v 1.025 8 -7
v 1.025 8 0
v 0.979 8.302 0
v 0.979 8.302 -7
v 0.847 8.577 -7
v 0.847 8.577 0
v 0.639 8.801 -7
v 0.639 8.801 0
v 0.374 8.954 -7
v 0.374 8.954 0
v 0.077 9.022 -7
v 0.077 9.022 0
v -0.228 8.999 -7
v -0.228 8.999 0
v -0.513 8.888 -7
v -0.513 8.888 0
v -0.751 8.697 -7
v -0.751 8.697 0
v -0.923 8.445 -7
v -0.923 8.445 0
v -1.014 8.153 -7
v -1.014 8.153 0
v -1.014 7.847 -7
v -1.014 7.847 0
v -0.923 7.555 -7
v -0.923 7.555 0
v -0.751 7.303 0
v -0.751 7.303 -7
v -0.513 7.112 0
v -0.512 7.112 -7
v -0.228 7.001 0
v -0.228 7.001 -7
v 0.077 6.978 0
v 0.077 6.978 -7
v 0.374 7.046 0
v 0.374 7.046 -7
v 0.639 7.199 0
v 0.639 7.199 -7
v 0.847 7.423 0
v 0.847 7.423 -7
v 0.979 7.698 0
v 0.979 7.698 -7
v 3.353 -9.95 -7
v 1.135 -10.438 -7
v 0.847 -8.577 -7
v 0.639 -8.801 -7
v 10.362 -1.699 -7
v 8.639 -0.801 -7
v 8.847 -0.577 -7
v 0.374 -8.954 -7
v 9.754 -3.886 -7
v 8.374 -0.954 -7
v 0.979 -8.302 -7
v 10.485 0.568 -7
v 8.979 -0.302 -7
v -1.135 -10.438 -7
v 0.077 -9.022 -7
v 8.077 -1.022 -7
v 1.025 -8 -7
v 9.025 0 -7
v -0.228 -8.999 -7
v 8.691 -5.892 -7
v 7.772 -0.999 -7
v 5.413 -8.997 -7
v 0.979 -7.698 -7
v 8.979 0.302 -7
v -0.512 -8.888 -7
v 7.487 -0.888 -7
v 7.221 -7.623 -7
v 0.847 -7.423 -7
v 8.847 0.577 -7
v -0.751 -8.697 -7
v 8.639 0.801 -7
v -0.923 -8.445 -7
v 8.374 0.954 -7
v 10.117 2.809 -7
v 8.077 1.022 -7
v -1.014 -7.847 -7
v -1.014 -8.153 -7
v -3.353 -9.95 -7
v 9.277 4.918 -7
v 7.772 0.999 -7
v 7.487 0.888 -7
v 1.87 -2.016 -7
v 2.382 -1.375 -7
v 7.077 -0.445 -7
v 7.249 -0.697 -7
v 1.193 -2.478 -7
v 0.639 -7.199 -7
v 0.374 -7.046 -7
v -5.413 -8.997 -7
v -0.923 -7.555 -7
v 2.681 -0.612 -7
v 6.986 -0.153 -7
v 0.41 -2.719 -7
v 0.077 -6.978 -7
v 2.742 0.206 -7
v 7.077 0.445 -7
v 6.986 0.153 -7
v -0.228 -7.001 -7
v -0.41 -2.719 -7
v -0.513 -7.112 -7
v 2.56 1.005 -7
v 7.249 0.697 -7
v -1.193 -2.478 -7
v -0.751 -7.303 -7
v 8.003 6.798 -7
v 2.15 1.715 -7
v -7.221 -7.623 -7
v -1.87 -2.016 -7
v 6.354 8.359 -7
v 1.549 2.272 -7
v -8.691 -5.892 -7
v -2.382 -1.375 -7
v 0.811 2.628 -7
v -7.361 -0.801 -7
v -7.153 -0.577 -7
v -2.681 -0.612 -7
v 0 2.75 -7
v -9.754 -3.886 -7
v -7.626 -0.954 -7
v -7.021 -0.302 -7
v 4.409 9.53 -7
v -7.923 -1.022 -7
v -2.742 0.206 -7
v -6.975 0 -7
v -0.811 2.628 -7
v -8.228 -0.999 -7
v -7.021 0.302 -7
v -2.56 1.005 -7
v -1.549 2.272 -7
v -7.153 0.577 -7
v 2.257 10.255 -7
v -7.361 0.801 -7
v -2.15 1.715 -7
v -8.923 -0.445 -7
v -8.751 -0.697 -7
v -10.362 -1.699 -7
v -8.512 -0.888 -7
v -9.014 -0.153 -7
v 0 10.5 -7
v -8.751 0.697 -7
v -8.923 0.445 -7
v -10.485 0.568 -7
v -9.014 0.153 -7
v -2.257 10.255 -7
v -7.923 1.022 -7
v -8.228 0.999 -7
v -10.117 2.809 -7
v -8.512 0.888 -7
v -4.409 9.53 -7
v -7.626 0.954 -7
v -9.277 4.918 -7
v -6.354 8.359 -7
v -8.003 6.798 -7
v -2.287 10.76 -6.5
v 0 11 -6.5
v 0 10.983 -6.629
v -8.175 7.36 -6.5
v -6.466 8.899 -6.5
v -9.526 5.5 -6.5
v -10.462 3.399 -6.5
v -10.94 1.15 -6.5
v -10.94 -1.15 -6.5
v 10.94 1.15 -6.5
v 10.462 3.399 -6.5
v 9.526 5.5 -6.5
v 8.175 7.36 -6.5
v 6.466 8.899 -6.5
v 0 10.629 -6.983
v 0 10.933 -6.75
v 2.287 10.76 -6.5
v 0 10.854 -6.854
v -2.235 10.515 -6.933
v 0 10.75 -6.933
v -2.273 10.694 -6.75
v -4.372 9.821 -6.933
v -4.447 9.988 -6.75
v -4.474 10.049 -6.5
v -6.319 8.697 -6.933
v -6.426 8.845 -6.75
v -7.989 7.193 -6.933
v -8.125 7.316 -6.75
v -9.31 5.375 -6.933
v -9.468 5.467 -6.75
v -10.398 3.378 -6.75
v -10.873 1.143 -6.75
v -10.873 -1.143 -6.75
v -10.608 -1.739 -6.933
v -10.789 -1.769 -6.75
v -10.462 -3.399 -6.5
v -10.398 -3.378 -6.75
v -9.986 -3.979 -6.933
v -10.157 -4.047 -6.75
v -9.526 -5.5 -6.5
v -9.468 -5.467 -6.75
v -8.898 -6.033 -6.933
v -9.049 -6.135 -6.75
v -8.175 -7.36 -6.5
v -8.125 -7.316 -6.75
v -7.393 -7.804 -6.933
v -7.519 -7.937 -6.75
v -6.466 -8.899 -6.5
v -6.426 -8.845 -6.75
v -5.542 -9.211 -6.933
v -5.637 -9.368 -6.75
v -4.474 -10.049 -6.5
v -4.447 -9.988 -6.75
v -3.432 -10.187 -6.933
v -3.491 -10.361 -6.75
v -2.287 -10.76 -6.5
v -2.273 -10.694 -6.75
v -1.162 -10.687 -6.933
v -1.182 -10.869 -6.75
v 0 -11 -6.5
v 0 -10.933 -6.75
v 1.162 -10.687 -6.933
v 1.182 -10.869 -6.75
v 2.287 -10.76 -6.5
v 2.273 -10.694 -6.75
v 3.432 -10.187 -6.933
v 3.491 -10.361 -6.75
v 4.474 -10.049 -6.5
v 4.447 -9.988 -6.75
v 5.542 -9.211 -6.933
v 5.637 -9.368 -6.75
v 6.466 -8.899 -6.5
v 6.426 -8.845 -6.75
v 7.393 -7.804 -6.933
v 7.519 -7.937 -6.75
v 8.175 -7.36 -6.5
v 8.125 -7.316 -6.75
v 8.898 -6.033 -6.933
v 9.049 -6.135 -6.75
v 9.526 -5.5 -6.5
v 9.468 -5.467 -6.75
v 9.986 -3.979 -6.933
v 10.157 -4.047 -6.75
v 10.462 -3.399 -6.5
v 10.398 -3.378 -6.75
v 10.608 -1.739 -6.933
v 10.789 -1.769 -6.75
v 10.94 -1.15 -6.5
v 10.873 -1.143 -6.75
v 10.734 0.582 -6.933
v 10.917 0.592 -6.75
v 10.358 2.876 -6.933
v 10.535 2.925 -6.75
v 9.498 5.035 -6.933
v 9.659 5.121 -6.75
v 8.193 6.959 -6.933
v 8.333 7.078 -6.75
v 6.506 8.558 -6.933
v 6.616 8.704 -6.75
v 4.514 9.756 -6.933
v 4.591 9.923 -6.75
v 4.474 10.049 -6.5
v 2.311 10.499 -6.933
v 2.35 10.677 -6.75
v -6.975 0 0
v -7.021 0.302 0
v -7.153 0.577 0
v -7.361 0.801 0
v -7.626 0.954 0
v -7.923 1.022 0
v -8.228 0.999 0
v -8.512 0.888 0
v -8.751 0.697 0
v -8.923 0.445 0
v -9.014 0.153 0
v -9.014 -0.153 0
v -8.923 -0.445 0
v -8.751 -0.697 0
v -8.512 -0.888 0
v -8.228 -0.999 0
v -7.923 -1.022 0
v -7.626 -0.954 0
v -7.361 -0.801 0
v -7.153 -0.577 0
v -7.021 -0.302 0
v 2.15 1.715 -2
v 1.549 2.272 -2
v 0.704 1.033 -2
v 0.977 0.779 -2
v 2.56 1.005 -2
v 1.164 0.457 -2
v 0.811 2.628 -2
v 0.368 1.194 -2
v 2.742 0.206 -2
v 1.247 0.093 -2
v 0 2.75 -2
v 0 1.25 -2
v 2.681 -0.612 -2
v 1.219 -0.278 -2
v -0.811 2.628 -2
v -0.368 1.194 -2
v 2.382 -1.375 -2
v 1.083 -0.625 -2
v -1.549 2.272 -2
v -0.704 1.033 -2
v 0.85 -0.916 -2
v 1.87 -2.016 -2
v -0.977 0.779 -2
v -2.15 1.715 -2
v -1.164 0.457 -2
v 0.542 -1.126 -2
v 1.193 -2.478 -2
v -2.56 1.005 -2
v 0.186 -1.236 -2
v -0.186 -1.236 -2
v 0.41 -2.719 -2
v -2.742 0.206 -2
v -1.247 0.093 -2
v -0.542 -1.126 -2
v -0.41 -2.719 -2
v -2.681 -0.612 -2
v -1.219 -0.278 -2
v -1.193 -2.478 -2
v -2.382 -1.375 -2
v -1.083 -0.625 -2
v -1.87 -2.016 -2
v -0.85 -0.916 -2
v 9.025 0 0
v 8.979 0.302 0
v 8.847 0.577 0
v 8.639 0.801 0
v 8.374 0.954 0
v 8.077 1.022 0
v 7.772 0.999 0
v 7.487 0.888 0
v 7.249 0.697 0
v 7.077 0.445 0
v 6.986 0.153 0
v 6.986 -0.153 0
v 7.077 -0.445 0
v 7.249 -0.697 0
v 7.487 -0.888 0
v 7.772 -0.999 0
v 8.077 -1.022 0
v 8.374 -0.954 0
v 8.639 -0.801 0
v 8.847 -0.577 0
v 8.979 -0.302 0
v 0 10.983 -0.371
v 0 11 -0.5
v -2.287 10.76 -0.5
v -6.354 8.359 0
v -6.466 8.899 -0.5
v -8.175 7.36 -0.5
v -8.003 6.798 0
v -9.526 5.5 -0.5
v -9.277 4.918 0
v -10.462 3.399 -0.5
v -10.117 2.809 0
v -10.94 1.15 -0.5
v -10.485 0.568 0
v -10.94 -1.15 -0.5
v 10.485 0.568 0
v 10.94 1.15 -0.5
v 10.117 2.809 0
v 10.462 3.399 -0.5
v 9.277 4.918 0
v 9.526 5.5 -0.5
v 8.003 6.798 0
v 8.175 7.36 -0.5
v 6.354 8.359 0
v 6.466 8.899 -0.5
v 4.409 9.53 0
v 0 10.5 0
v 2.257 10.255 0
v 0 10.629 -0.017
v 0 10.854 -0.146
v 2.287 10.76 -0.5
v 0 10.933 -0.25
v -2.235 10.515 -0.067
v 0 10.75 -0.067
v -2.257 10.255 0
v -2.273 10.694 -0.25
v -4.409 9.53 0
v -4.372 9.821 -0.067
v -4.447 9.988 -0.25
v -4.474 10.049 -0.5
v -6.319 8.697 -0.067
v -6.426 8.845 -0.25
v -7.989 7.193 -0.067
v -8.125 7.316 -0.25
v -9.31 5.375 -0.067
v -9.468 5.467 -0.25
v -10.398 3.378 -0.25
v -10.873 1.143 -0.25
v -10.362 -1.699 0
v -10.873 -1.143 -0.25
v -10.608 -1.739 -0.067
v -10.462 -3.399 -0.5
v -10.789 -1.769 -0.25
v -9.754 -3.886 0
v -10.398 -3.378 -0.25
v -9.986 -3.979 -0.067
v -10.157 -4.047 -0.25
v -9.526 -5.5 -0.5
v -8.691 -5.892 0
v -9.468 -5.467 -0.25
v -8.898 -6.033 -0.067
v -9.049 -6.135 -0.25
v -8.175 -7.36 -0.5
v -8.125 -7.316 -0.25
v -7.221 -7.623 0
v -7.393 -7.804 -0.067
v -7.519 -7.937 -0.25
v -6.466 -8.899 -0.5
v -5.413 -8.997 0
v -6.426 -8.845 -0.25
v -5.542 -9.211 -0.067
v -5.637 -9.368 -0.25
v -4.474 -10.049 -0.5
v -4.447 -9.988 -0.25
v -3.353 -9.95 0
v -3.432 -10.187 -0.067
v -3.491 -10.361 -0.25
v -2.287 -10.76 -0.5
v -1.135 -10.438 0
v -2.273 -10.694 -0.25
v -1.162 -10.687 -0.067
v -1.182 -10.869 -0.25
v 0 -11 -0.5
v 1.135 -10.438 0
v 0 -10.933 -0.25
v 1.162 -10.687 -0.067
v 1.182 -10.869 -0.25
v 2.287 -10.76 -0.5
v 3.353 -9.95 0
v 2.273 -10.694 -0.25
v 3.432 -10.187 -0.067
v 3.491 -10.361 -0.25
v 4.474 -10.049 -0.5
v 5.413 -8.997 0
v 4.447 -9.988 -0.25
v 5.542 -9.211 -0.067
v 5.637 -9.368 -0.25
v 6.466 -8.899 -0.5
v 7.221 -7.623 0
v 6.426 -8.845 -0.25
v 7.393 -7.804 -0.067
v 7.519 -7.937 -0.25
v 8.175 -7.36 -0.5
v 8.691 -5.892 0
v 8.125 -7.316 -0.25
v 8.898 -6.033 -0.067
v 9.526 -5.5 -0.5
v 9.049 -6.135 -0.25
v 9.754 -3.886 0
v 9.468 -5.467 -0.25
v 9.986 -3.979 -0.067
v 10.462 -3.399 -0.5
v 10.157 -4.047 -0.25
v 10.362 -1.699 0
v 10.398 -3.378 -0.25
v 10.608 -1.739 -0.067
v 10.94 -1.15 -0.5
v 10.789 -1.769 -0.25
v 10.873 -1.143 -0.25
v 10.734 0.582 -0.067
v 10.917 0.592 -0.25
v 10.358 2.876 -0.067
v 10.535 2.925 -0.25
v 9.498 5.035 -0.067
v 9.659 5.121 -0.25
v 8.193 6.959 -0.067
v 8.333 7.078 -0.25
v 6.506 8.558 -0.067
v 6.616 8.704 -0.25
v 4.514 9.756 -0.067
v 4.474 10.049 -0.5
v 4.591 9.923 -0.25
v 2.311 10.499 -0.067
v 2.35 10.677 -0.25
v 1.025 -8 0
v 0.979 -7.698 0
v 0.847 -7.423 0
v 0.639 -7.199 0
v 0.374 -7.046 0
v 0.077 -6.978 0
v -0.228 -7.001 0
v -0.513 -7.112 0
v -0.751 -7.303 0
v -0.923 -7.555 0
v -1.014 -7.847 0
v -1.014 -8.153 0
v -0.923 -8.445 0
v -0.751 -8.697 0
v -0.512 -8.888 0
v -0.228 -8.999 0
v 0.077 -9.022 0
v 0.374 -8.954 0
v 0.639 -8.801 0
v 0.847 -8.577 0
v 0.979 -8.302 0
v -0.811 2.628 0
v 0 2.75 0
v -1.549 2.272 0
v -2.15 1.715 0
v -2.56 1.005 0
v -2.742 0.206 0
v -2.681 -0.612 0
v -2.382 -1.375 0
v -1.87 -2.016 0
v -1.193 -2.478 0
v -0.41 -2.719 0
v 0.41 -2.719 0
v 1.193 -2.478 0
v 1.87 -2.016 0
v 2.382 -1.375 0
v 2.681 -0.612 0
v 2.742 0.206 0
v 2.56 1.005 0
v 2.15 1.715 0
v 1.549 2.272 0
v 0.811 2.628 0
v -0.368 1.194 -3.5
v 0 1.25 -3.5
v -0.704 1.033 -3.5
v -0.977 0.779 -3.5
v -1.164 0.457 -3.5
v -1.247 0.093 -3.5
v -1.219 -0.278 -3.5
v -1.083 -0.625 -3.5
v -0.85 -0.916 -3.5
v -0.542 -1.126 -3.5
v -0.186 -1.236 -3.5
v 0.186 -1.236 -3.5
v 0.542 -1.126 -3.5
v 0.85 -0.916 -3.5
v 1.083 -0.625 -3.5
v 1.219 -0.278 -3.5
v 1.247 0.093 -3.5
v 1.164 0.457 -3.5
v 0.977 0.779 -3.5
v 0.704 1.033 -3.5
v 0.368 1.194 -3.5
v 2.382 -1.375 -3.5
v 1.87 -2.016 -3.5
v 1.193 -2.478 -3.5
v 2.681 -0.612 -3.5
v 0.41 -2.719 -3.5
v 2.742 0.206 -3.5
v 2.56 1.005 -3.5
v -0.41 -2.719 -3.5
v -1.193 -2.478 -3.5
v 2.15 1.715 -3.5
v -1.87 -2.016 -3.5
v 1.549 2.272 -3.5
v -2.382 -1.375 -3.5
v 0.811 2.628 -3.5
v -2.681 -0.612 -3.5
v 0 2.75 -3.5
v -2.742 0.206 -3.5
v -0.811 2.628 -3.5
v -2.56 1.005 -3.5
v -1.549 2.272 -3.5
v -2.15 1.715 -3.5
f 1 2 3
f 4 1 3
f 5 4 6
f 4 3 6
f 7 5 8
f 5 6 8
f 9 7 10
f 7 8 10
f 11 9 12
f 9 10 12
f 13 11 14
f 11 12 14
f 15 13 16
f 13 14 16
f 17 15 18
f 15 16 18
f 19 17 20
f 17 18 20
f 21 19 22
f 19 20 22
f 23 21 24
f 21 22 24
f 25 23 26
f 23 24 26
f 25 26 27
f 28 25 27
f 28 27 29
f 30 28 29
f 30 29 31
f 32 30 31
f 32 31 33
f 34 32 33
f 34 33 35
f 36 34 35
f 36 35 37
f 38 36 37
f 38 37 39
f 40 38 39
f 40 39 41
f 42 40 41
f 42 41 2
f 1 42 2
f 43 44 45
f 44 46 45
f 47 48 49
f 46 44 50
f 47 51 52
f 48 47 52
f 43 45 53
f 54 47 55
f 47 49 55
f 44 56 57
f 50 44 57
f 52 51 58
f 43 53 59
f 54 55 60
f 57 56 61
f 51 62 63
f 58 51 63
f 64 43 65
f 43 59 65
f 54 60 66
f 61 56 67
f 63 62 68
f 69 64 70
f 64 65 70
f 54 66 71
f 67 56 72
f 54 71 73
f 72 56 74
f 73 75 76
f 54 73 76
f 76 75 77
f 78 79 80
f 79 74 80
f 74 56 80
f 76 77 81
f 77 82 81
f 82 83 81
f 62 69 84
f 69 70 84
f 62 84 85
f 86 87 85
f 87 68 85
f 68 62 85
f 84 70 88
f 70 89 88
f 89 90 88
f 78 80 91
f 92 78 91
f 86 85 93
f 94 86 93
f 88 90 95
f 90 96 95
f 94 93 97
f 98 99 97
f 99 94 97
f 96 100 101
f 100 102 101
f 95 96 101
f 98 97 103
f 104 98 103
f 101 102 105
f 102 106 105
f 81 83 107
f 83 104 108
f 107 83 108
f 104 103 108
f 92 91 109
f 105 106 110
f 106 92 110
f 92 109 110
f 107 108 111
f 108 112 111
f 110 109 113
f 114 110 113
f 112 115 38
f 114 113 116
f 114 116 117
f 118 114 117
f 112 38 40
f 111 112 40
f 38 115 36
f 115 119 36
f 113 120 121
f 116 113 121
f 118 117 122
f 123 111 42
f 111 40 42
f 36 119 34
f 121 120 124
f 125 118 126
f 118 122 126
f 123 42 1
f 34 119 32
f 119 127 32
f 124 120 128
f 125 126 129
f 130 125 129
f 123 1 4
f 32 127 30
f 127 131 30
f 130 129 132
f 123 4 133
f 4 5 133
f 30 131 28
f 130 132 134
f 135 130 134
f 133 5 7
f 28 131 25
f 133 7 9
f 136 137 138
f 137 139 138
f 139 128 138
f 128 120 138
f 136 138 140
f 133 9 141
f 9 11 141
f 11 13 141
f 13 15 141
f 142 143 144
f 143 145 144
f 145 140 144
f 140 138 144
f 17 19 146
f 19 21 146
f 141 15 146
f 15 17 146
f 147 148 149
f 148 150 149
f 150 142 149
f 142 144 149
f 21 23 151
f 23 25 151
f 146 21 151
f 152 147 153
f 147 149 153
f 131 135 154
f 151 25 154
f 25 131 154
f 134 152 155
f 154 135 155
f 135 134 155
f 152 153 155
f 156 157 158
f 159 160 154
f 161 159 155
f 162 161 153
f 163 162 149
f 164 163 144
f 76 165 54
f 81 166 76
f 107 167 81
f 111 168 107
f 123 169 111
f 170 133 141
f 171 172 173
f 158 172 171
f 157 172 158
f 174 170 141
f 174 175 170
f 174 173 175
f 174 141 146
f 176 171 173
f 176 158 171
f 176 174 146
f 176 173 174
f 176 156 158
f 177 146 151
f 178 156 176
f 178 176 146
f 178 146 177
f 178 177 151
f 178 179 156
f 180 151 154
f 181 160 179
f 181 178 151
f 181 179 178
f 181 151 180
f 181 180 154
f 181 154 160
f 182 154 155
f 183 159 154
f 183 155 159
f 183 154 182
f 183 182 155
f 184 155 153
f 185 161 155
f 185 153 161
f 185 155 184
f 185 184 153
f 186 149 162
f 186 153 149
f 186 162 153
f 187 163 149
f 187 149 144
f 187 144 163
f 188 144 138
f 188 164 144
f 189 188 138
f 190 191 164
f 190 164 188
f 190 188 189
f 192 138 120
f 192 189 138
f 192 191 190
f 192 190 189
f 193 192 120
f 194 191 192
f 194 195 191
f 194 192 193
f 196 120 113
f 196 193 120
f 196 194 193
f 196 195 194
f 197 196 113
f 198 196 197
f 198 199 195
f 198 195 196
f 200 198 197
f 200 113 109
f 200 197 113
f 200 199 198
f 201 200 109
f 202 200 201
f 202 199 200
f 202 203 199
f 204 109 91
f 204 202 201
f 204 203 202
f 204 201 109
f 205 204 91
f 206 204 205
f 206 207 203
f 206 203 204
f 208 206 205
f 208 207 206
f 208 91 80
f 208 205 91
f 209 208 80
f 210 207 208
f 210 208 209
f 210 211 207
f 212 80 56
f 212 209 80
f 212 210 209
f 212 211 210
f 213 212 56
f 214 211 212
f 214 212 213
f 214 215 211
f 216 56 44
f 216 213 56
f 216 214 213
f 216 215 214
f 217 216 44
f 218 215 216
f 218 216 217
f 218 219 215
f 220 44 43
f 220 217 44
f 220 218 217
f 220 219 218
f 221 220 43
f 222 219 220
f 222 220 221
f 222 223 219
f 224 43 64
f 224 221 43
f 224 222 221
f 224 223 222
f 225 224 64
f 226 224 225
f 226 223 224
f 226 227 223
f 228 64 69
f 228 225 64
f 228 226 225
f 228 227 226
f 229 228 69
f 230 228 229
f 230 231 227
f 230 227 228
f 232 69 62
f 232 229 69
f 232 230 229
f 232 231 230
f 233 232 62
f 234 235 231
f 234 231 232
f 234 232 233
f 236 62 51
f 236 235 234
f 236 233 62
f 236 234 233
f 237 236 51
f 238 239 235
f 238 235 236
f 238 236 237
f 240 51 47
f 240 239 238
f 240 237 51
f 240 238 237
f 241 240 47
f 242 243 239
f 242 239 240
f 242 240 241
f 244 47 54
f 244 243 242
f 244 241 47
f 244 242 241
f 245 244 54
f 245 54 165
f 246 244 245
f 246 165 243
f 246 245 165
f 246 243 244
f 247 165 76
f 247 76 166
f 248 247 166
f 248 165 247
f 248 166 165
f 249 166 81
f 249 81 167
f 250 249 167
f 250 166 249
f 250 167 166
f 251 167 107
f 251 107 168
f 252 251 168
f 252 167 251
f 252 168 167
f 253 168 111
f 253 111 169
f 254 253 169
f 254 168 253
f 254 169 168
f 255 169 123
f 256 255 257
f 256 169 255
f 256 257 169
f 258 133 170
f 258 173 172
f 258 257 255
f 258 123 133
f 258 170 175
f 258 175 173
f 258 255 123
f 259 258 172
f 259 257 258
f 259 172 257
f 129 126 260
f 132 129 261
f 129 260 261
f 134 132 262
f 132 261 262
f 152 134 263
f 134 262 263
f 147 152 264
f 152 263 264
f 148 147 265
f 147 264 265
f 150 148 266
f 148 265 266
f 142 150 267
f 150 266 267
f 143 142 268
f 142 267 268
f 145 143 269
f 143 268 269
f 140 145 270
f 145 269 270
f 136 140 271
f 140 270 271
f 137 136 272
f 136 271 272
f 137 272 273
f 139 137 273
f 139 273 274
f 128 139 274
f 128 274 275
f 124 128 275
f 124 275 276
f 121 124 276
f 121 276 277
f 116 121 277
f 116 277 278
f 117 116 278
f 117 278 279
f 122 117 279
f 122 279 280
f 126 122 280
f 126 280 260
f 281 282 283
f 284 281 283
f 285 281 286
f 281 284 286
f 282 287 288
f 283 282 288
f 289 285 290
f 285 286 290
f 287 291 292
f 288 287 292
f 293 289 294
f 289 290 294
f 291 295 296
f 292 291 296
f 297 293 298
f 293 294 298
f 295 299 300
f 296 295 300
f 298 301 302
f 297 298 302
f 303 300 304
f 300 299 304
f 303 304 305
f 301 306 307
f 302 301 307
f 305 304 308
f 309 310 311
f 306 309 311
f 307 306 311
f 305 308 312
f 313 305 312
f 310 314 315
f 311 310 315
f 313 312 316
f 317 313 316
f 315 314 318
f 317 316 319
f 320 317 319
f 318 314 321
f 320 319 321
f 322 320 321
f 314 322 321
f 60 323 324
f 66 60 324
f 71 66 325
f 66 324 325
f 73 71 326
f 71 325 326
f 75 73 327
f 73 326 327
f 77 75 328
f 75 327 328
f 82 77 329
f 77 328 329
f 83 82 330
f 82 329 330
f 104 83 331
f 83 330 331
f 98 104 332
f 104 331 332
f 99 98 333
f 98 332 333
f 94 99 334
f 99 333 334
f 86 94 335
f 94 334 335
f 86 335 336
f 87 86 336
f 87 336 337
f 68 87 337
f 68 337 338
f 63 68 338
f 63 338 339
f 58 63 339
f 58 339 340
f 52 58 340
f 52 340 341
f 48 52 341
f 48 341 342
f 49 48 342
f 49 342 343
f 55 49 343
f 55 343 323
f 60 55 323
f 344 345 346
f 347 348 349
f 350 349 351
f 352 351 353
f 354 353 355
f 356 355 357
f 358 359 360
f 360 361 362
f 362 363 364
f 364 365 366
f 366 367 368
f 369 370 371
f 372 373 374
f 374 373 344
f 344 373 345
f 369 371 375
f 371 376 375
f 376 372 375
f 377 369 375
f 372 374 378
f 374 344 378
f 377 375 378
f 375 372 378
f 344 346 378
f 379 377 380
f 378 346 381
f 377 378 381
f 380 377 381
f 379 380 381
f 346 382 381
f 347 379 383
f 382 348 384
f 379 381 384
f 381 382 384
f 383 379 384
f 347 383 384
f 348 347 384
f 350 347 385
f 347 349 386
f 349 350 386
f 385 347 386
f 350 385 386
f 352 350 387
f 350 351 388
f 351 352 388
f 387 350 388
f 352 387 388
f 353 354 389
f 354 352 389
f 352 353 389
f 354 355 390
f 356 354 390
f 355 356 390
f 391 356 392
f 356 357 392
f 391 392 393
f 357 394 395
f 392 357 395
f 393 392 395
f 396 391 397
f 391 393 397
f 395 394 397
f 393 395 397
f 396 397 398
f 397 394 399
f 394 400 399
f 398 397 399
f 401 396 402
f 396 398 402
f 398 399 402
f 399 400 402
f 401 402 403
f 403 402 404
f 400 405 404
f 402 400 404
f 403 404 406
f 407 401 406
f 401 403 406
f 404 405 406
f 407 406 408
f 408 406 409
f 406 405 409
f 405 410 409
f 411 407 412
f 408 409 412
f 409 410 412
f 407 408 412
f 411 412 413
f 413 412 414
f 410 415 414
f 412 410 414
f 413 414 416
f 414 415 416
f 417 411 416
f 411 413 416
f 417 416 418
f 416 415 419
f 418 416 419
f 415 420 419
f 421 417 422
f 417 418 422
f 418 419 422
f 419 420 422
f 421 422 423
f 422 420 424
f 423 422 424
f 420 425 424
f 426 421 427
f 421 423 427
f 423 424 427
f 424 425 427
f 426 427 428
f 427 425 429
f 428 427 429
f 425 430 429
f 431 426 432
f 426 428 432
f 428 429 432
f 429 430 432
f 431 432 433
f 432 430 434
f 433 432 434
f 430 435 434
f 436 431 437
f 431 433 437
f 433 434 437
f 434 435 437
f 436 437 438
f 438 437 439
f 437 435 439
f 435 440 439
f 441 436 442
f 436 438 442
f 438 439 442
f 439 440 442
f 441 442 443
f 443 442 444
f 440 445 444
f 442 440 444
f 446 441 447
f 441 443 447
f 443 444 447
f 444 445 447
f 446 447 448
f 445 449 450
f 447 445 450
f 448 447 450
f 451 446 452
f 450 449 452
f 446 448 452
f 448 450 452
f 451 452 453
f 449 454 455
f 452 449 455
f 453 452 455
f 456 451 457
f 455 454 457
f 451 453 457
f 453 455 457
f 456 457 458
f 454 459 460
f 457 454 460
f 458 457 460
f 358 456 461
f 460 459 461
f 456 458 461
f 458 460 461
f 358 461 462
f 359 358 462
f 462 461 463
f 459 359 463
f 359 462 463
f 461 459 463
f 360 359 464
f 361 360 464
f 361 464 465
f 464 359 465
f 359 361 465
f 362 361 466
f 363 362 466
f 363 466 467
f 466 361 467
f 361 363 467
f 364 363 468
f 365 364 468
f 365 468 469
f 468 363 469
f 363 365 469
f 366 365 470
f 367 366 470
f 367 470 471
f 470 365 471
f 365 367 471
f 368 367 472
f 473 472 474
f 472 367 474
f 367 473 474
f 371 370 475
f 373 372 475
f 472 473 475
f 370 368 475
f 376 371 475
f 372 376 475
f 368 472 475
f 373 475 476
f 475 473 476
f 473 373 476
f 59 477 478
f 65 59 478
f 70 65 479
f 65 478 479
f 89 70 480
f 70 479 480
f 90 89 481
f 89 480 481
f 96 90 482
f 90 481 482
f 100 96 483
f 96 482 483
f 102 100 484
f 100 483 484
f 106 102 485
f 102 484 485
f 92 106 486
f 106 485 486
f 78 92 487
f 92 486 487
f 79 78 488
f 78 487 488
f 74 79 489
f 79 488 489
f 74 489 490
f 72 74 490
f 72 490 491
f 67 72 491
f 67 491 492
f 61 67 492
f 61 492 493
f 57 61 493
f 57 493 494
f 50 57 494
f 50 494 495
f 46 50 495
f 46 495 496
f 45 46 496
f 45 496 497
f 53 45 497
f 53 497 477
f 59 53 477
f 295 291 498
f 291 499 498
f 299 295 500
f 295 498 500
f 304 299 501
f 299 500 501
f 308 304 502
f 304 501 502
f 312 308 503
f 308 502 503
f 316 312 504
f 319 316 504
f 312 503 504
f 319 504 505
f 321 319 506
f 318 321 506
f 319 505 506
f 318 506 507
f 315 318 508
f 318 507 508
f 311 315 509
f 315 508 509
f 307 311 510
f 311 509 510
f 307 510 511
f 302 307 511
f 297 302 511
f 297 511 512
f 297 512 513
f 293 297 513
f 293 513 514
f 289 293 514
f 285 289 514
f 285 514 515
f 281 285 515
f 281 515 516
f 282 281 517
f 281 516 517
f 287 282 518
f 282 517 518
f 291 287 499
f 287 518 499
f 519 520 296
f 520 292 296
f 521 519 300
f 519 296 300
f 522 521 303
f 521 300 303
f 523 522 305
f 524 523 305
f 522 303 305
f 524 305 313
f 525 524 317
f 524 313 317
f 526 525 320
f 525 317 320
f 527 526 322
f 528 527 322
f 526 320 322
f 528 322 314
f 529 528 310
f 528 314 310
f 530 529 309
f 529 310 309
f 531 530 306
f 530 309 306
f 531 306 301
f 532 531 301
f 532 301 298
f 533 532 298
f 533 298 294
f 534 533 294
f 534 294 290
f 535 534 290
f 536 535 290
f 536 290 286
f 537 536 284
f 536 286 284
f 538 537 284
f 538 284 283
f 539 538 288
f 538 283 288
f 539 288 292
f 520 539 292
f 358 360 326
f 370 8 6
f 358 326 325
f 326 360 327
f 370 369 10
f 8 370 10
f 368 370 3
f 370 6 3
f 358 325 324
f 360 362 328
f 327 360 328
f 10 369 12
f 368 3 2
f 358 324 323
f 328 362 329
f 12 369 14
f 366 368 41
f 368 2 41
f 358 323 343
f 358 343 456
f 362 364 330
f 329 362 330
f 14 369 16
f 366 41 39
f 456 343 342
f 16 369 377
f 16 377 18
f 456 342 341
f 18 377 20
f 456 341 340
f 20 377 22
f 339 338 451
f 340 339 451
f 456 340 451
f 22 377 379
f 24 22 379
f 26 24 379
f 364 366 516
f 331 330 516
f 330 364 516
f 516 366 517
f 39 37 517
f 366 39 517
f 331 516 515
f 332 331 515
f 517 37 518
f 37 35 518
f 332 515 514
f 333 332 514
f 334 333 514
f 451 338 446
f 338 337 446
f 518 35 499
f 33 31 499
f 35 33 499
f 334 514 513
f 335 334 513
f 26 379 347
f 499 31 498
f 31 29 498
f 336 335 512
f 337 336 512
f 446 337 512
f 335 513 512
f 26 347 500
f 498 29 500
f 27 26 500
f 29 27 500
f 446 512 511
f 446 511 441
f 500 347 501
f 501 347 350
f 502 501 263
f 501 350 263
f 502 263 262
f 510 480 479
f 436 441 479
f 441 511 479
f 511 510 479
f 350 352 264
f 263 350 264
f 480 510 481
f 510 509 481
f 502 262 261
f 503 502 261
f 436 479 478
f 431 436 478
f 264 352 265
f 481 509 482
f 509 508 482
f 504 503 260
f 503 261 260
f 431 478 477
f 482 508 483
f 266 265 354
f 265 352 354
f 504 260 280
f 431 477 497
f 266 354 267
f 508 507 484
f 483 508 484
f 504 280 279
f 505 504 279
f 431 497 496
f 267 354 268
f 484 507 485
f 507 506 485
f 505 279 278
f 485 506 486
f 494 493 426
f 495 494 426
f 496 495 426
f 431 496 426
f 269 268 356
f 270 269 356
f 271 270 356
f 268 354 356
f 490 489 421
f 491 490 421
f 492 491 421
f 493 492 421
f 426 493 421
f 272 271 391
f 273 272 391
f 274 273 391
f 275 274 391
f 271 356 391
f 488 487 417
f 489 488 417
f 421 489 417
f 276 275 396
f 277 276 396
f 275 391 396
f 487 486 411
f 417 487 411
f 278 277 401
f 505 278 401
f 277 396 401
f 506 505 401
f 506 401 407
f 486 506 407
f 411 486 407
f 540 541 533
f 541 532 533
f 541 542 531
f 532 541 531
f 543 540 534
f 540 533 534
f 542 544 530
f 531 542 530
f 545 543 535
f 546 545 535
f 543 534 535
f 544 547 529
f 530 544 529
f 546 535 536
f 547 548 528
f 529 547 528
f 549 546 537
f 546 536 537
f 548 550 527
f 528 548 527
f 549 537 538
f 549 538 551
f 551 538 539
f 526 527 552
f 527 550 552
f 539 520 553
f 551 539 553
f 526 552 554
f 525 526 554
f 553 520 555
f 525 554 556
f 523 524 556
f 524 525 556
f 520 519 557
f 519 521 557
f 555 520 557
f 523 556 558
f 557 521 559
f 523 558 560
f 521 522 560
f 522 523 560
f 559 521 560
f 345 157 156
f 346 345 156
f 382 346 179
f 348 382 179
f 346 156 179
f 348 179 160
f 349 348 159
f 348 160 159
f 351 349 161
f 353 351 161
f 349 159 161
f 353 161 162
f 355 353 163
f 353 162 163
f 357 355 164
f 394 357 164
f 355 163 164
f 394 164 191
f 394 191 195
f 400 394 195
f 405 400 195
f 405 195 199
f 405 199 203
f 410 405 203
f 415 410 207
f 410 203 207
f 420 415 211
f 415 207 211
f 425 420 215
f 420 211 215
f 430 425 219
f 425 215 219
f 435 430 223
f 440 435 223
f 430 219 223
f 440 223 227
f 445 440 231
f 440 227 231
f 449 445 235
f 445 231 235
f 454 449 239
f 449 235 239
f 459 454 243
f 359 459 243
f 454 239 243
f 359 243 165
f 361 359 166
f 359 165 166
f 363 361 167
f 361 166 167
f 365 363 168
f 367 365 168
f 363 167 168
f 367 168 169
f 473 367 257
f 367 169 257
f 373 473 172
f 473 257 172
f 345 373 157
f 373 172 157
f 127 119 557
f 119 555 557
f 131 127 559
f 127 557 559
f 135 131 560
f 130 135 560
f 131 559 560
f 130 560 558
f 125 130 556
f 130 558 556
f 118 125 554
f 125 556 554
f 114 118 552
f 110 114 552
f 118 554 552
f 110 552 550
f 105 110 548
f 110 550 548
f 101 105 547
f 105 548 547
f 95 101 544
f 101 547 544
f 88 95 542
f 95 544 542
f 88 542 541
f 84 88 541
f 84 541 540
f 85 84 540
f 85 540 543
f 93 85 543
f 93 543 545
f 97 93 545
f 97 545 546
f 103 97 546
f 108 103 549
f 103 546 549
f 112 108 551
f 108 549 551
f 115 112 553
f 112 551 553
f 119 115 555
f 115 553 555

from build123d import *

# Parameters (mm, degrees)
M2_TAPPED_HOLE1_AT_2_COUNT = 2
M2_TAPPED_HOLE1_AT_2_PITCH = 11.313708499
M2_TAPPED_HOLE1_AT_3_COUNT = 2
M2_TAPPED_HOLE1_AT_3_PITCH = 16
M2_TAPPED_HOLE1_AT_4_COUNT = 2
M2_TAPPED_HOLE1_AT_4_PITCH = 11.313708499
M2_TAPPED_HOLE1_AT_5_COUNT = 2
M2_TAPPED_HOLE1_AT_5_PITCH = 8
RADYUS1_R                  = 0.5
IZIM1_R                    = 1.025
KES_EKSTR_ZYON1_DEPTH      = 10


with BuildPart() as part:
    # Sketch1 → Revolve1 (revolve)
    with BuildSketch(Plane(origin=(0, 0, 0), x_dir=(0, 0, -1), z_dir=(1, 0, 0))):
        Polygon((3.5, 1.25), (2, 1.25), (2, 2.75), (0, 2.75), (0, 11), (7, 11), (7, 2.75), (3.5, 2.75), align=None)
    revolve(axis=Axis((0, 0, 0), (0, 0, 1)))

    # Sketch4 → M2 Tapped Hole1 (revolve, cut)
    with BuildSketch(Plane(origin=(0, 8, 0), x_dir=(0, -1, 0), z_dir=(1, 0, 0))):
        Polygon((0, 0), (0, 7), (1.025, 7), (0.8, 6.870096189), (0.8, 0.129903811), (1.025, 0), align=None)
    m2_tapped_hole1 = revolve(axis=Axis((0, 8, 6.35), (0, 0, -1)), mode=Mode.SUBTRACT)

    # M2 Tapped Hole1 at 2: M2 Tapped Hole1 ×2
    with Locations(*[Vector(0.707106781, -0.707106781, 0) * (i * M2_TAPPED_HOLE1_AT_2_PITCH) for i in range(1, M2_TAPPED_HOLE1_AT_2_COUNT)]):
        add(m2_tapped_hole1, mode=Mode.SUBTRACT)

    # M2 Tapped Hole1 at 3: M2 Tapped Hole1 ×2
    with Locations(*[(0, -i * M2_TAPPED_HOLE1_AT_3_PITCH, 0) for i in range(1, M2_TAPPED_HOLE1_AT_3_COUNT)]):
        add(m2_tapped_hole1, mode=Mode.SUBTRACT)

    # M2 Tapped Hole1 at 4: M2 Tapped Hole1 ×2
    with Locations(*[Vector(-0.707106781, -0.707106781, 0) * (i * M2_TAPPED_HOLE1_AT_4_PITCH) for i in range(1, M2_TAPPED_HOLE1_AT_4_COUNT)]):
        add(m2_tapped_hole1, mode=Mode.SUBTRACT)

    # M2 Tapped Hole1 at 5: M2 Tapped Hole1 ×2
    with Locations(*[(0, -i * M2_TAPPED_HOLE1_AT_5_PITCH, 0) for i in range(1, M2_TAPPED_HOLE1_AT_5_COUNT)]):
        add(m2_tapped_hole1, mode=Mode.SUBTRACT)

    # Radyus1
    radyus1_edges = [part.edges().sort_by_distance(p)[0] for p in [
        (0, -11, -7),
        (0, -11, 0),
    ]]
    fillet(radyus1_edges, radius=RADYUS1_R)

    # Çizim1 → Kes-Ekstrüzyon1 (cut)
    with BuildSketch(Plane.XY):
        with Locations((0, 8)):
            Circle(IZIM1_R)
        with Locations((-8, 0)):
            Circle(IZIM1_R)
        with Locations((8, 0)):
            Circle(IZIM1_R)
        with Locations((0, -8)):
            Circle(IZIM1_R)
    extrude(amount=-KES_EKSTR_ZYON1_DEPTH, mode=Mode.SUBTRACT)


solid = part.part
